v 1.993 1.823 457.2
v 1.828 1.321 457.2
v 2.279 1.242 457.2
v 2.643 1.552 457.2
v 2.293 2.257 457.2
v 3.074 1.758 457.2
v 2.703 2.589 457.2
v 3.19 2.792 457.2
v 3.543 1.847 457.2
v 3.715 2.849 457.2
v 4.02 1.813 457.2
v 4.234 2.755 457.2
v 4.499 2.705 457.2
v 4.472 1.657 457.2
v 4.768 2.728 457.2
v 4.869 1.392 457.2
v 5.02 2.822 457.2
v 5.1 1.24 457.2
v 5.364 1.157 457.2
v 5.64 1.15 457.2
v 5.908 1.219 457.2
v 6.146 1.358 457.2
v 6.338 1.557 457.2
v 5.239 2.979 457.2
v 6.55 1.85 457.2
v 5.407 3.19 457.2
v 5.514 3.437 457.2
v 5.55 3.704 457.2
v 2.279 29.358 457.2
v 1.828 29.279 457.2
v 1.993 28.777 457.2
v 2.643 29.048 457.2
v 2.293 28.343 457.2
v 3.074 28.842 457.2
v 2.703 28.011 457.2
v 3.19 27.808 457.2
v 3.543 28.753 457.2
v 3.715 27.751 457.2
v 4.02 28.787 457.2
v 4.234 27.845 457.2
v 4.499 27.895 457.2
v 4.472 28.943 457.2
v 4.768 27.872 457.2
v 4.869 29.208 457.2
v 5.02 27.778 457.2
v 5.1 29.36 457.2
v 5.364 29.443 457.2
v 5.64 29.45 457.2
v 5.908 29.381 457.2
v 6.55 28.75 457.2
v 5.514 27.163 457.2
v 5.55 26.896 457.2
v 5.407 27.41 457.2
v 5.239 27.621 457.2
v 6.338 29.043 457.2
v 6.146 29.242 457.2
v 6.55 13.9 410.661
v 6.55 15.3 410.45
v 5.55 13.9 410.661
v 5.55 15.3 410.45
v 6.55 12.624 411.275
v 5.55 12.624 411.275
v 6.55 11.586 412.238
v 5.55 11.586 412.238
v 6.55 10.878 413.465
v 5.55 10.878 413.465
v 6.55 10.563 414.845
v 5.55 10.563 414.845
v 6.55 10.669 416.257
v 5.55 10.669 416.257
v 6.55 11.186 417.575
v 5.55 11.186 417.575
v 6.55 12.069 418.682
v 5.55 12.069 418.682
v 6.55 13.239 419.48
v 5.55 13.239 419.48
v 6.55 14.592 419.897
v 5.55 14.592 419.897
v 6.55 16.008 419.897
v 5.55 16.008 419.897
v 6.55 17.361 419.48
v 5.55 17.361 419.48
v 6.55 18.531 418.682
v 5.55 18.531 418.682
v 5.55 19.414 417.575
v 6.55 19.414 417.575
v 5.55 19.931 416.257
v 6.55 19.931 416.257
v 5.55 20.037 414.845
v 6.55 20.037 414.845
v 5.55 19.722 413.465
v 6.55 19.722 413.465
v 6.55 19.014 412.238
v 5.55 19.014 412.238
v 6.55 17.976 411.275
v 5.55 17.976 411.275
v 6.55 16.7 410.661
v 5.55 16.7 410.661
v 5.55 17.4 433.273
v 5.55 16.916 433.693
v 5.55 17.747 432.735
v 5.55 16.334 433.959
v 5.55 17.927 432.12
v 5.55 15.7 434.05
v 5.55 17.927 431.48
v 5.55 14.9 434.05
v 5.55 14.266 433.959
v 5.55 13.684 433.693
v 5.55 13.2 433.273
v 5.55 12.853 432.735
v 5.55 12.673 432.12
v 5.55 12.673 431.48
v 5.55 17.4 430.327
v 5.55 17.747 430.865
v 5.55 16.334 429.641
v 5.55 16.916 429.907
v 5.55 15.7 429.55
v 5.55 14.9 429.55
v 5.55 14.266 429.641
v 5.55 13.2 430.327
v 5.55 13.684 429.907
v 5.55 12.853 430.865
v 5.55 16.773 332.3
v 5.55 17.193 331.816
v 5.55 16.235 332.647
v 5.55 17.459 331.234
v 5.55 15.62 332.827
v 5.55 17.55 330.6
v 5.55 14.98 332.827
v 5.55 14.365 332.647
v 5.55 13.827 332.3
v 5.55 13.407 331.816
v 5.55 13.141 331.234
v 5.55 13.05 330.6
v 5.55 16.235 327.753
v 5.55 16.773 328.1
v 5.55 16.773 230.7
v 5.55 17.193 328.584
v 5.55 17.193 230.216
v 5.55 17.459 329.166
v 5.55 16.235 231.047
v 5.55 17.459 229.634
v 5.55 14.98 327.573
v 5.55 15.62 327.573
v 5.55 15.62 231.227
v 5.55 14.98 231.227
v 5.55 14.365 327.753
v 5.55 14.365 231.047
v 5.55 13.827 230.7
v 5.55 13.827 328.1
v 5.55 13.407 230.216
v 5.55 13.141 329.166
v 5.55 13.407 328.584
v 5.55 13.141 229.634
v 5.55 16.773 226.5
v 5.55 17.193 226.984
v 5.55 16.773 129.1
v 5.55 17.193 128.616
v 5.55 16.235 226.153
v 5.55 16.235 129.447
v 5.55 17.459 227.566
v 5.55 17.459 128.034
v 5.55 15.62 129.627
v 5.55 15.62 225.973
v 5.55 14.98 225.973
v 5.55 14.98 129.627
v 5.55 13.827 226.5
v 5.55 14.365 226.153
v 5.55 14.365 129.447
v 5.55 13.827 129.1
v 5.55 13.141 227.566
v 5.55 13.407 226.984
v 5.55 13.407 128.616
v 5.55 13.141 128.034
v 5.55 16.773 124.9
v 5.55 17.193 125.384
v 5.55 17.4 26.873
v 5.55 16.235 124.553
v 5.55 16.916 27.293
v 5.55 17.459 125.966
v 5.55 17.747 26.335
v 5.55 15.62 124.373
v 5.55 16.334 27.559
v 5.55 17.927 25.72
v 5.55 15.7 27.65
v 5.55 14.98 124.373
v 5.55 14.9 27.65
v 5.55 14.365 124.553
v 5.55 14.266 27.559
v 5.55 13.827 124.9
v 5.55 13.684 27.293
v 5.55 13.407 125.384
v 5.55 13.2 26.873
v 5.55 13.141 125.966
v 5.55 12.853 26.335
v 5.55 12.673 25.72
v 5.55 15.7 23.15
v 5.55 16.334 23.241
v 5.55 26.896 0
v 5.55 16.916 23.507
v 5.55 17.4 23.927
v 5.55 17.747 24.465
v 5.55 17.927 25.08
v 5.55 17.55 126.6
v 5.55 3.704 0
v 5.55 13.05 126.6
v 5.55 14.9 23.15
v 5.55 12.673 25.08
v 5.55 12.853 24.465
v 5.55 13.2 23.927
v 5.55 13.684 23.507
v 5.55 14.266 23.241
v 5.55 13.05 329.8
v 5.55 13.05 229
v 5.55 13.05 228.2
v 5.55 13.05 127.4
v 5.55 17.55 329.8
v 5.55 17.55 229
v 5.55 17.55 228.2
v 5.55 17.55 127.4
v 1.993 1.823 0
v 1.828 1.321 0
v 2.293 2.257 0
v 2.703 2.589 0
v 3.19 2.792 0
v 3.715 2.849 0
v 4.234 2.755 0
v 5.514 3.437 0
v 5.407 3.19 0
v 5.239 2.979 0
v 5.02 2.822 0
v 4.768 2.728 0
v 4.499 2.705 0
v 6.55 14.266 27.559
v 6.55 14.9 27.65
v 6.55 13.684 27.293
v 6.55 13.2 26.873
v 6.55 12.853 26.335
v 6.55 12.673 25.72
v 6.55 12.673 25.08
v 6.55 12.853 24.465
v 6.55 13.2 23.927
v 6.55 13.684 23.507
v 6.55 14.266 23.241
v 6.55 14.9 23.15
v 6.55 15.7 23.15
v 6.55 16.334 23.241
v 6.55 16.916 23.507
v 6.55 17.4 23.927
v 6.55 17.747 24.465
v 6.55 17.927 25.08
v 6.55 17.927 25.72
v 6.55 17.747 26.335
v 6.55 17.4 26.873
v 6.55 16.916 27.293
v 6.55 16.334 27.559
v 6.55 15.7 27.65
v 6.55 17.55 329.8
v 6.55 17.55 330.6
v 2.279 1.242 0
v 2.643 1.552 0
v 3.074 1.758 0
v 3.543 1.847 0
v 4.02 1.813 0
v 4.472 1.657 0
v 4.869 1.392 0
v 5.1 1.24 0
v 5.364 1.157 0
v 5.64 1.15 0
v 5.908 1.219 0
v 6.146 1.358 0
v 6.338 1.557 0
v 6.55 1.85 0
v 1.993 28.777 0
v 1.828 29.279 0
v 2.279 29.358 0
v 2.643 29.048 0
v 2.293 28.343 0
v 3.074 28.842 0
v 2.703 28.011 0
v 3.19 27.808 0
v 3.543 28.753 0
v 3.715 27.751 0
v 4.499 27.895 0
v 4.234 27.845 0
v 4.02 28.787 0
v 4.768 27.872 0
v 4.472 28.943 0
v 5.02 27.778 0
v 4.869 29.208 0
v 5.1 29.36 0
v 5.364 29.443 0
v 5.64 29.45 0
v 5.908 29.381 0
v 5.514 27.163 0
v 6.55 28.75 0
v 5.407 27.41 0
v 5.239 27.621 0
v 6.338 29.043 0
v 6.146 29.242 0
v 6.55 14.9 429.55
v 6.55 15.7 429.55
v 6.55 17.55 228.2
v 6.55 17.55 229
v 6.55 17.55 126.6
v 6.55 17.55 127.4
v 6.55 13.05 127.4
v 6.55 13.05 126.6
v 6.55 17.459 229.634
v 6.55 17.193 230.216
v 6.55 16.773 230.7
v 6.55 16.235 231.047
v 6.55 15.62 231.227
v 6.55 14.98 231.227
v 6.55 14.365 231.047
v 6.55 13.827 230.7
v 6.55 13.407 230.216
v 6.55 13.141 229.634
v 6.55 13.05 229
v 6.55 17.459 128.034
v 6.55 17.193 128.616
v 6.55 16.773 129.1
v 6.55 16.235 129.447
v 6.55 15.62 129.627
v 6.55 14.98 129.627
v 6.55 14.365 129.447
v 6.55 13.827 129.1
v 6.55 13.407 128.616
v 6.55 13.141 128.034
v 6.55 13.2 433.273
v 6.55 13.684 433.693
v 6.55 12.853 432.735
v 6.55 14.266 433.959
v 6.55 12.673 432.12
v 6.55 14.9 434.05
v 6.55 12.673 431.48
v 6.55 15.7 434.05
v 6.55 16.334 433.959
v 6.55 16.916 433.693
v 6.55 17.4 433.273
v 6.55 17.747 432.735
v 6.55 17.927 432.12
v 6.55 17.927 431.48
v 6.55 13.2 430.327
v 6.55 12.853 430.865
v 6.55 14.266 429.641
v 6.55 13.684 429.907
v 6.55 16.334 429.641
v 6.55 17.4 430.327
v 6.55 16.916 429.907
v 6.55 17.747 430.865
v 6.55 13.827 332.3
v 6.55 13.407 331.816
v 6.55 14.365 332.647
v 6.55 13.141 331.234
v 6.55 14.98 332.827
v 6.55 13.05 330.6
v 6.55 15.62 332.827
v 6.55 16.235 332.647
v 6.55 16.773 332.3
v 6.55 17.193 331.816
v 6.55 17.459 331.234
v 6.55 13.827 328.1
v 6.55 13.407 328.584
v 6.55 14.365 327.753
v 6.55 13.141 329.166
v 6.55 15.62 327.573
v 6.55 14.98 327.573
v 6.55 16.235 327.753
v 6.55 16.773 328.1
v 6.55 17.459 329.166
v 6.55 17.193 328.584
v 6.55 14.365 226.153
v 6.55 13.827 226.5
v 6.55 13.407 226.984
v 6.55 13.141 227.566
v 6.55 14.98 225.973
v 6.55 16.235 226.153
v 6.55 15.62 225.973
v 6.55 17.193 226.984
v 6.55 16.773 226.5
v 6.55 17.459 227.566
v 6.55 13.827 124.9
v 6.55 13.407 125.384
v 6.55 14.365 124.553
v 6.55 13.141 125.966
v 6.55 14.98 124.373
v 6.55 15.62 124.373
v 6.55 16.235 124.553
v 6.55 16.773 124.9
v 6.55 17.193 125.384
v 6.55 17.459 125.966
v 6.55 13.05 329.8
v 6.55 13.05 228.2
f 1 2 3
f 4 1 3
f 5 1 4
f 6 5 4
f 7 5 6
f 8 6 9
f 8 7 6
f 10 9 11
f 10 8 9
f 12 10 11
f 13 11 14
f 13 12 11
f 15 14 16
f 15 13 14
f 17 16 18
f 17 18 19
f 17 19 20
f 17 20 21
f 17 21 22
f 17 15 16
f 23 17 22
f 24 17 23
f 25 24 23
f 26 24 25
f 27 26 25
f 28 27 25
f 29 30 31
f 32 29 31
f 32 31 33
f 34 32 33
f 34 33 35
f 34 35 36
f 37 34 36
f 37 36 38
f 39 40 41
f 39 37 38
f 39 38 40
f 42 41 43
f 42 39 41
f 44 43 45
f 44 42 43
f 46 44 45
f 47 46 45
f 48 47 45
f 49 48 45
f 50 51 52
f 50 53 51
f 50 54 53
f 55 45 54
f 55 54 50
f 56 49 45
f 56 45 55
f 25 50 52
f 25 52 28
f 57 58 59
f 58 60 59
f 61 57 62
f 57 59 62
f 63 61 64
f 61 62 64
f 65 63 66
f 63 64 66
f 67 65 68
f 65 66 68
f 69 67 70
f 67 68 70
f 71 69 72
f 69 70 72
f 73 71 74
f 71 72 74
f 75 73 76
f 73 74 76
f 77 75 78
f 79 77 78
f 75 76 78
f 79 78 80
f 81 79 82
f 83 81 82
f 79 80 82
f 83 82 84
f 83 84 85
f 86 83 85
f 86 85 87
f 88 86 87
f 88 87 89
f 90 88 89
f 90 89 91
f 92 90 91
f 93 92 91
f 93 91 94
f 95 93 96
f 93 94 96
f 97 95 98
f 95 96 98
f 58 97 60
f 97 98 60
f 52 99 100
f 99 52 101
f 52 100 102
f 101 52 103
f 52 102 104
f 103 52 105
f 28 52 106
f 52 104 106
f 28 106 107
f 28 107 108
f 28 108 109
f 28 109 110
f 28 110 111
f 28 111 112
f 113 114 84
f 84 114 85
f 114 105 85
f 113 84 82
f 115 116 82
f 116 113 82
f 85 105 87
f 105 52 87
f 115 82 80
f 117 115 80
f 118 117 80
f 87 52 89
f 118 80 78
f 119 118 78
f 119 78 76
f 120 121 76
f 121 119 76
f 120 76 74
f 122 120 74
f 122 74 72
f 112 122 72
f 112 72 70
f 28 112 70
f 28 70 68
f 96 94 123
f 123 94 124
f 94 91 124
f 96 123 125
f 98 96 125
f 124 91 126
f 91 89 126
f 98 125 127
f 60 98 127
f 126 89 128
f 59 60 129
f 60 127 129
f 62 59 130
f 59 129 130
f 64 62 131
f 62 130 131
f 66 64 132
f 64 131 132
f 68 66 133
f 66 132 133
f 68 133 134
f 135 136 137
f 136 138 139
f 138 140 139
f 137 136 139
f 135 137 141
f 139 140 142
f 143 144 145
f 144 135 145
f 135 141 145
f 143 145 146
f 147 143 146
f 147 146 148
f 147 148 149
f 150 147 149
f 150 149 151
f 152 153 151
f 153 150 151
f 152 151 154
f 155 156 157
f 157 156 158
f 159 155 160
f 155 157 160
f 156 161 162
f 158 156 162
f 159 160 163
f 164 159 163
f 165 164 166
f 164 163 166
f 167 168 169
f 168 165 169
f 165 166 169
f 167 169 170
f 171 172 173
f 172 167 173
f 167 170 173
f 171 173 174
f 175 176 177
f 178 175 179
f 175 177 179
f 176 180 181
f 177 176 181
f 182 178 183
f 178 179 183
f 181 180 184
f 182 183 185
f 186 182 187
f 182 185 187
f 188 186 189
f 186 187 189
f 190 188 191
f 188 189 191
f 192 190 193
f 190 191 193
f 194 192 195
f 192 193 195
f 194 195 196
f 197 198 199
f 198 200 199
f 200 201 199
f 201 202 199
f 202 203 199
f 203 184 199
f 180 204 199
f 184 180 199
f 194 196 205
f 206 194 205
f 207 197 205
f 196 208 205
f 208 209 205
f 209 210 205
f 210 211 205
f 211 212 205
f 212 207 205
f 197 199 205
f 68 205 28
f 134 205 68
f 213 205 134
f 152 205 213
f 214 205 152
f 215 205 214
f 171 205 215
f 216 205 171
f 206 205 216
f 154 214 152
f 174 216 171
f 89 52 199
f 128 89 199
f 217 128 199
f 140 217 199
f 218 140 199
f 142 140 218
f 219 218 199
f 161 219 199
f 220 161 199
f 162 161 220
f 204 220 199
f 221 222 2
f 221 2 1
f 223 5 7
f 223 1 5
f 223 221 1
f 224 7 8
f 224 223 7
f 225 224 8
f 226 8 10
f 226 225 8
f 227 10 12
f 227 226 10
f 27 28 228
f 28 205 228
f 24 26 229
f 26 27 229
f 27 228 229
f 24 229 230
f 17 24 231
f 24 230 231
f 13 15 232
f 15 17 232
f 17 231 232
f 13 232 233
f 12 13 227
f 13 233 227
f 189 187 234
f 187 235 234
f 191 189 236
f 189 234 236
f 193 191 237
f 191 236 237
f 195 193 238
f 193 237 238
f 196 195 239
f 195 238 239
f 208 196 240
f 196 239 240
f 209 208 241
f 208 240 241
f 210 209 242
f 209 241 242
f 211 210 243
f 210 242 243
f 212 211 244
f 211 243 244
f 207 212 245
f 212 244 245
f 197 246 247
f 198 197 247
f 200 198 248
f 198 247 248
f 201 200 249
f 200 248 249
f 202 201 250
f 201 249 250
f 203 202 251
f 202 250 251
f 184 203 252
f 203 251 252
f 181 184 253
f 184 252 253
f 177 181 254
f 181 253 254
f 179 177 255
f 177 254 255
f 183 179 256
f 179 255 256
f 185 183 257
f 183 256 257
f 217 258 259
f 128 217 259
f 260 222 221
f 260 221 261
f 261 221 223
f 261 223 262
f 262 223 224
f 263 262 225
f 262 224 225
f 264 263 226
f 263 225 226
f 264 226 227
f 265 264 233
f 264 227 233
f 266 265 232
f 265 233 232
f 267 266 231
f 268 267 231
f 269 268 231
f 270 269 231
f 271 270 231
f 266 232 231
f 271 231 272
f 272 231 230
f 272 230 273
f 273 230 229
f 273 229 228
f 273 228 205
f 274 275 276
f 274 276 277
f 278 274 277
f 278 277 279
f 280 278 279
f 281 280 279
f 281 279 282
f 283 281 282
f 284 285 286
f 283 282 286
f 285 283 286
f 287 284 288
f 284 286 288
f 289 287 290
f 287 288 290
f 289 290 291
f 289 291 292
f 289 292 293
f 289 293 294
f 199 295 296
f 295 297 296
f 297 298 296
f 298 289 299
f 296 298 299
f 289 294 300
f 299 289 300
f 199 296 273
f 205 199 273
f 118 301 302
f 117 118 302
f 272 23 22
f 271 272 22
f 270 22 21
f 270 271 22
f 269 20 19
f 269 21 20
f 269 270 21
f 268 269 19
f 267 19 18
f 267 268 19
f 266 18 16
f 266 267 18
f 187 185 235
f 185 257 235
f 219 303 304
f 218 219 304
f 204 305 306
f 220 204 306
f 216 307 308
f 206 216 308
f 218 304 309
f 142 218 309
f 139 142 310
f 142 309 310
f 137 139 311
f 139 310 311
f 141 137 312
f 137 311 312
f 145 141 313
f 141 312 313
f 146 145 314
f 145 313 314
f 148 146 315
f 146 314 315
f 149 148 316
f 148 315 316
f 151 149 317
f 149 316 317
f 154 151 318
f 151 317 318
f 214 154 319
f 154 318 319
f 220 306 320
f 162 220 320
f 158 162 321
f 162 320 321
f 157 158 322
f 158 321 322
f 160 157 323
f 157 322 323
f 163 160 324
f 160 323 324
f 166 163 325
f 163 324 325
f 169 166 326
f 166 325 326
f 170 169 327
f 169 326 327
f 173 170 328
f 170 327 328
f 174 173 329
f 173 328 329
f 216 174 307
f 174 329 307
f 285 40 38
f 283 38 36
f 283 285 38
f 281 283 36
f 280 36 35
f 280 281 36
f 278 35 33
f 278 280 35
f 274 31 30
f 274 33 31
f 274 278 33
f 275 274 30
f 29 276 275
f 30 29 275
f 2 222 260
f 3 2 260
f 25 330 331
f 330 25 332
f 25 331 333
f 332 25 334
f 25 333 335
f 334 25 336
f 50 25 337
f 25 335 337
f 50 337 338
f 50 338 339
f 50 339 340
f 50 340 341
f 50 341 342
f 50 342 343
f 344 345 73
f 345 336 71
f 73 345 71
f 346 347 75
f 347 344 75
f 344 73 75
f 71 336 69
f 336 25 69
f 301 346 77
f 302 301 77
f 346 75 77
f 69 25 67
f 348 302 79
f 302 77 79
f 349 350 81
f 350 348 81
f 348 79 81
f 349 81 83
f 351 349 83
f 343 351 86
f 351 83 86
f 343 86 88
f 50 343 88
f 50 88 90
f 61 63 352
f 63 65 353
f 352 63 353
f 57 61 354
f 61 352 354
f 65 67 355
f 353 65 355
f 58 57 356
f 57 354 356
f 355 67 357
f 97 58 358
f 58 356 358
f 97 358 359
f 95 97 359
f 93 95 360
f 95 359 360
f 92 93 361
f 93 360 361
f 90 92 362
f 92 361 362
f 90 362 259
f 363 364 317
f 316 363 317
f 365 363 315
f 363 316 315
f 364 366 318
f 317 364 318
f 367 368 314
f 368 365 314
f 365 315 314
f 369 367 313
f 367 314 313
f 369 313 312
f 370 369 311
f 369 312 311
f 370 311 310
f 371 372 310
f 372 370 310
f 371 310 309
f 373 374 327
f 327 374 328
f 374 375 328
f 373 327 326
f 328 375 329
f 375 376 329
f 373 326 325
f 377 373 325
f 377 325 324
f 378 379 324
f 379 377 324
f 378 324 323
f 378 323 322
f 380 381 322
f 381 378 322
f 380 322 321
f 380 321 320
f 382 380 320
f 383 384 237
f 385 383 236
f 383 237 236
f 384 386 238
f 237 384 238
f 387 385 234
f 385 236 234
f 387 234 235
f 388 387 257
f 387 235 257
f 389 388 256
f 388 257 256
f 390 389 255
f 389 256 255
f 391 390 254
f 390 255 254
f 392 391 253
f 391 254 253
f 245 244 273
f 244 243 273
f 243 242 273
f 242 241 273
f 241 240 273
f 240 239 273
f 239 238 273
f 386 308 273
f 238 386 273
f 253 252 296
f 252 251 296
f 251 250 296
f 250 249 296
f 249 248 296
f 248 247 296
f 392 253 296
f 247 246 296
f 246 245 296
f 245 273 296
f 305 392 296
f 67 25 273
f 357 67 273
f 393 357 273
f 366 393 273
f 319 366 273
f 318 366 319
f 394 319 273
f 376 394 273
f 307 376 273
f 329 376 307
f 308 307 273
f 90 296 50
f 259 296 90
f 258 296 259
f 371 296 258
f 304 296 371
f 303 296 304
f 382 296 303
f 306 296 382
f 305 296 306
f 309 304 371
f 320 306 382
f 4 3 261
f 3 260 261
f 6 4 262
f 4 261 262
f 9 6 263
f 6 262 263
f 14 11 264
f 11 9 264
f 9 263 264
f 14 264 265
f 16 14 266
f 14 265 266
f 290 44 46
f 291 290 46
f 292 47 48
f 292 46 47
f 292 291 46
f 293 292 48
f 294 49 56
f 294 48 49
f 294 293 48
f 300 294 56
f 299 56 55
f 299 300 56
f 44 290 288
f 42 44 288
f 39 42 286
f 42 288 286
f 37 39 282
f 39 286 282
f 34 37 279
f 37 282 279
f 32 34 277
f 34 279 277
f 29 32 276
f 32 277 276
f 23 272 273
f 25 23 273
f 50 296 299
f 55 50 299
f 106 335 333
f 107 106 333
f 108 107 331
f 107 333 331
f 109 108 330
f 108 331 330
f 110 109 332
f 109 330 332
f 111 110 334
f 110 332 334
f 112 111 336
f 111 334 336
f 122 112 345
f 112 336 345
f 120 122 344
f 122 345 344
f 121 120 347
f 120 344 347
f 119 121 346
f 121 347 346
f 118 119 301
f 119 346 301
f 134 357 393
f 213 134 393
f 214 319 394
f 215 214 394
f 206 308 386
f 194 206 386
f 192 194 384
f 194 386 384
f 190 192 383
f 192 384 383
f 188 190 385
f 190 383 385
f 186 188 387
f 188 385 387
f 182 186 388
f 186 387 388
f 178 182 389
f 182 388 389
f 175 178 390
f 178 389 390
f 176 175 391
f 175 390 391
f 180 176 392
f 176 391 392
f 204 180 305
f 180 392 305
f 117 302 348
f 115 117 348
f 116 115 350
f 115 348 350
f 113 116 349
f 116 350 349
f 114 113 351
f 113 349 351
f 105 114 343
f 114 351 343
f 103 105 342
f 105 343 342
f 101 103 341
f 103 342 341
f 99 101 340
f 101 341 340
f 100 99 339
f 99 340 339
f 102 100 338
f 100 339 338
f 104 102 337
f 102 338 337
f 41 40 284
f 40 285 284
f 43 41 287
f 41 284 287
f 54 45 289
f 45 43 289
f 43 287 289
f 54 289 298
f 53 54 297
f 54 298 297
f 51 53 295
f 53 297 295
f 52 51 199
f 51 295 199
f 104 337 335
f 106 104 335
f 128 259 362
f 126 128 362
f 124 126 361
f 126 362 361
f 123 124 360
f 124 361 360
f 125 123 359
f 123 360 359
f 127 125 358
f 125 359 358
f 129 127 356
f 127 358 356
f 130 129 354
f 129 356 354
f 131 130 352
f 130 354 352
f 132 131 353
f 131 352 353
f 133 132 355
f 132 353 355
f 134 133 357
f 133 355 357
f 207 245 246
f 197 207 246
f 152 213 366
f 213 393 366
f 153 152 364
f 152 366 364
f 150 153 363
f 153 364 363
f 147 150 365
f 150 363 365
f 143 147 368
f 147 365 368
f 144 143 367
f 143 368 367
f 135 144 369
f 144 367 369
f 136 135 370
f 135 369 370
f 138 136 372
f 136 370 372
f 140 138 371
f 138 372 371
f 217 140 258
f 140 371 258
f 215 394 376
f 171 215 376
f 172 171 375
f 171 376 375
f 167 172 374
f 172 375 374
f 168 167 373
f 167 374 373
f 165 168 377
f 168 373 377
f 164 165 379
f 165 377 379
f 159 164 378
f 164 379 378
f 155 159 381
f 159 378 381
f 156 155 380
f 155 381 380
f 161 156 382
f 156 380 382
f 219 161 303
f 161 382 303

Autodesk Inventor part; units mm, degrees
sketch "Sketch_1" plane through (0, 0, 0) normal (0, 0, 1) x (1, 0, 0)
  arc A0 (1.8281, 29.2788) -> (4.2342, 27.8447) centre (3.65, 29.6) ccw
  arc A1 (5.55, 26.8958) -> (4.2342, 27.8447) centre (4.55, 26.8958) ccw
  line L0 (5.55, 26.8958) -> (5.55, 3.7042)
  arc A2 (4.2342, 2.7553) -> (5.55, 3.7042) centre (4.55, 3.7042) ccw
  arc A3 (4.2342, 2.7553) -> (1.8281, 1.3212) centre (3.65, 1) ccw
  line L1 (1.8281, 1.3212) -> (2.2787, 1.2418)
  arc A4 (4.8691, 1.3916) -> (2.2787, 1.2418) centre (3.65, 0) ccw
  arc A5 (4.8691, 1.3916) -> (6.3379, 1.5571) centre (5.528, 2.1437) ccw
  line L2 (6.3379, 1.5571) -> (6.55, 1.85)
  line L3 (6.55, 1.85) -> (6.55, 28.75)
  line L4 (6.55, 28.75) -> (6.3379, 29.0429)
  arc A6 (6.3379, 29.0429) -> (4.8691, 29.2084) centre (5.528, 28.4563) ccw
  arc A7 (2.2787, 29.3582) -> (4.8691, 29.2084) centre (3.65, 30.6) ccw
  line L5 (2.2787, 29.3582) -> (1.8281, 29.2788)
extrude "Extrusion1" add sketch "Sketch_1" along normal blind 457.2
sketch "Sketch2" plane through (6.55, 1.85, 0) normal (1, 0, 0) x (0, 0, -1)
  point P0 (-415.2, 13.45)
hole "Hole1" at (6.55, 15.3, 415.2) direction (-1, 0, 0) diameter 9.5 depth 1
sketch "Sketch_5" plane through (6.55, 0, 0) normal (1, 0, 0) x (0, 0, -1)
  line L0 (-434.05, 15.7) -> (-434.05, 14.9)
  arc A0 (-434.05, 14.9) -> (-431.8, 12.65) centre (-431.8, 14.9) ccw
  arc A1 (-431.8, 12.65) -> (-429.55, 14.9) centre (-431.8, 14.9) ccw
  line L1 (-429.55, 14.9) -> (-429.55, 15.7)
  arc A2 (-429.55, 15.7) -> (-431.8, 17.95) centre (-431.8, 15.7) ccw
  arc A3 (-431.8, 17.95) -> (-434.05, 15.7) centre (-431.8, 15.7) ccw
extrude "Extrusion2" cut sketch "Sketch_5" against normal blind 1
sketch "Sketch_6" plane through (6.55, 0, 0) normal (1, 0, 0) x (0, 0, -1)
  line L0 (-27.65, 15.7) -> (-27.65, 14.9)
  arc A0 (-27.65, 14.9) -> (-25.4, 12.65) centre (-25.4, 14.9) ccw
  arc A1 (-25.4, 12.65) -> (-23.15, 14.9) centre (-25.4, 14.9) ccw
  line L1 (-23.15, 14.9) -> (-23.15, 15.7)
  arc A2 (-23.15, 15.7) -> (-25.4, 17.95) centre (-25.4, 15.7) ccw
  arc A3 (-25.4, 17.95) -> (-27.65, 15.7) centre (-25.4, 15.7) ccw
extrude "Extrusion3" cut sketch "Sketch_6" against normal blind 1
sketch "Sketch_7" plane through (6.55, 0, 0) normal (1, 0, 0) x (0, 0, -1)
  arc A0 (-332.85, 15.3) -> (-330.6, 13.05) centre (-330.6, 15.3) ccw
  line L0 (-330.6, 13.05) -> (-329.8, 13.05)
  arc A1 (-329.8, 13.05) -> (-327.55, 15.3) centre (-329.8, 15.3) ccw
  arc A2 (-327.55, 15.3) -> (-329.8, 17.55) centre (-329.8, 15.3) ccw
  line L1 (-329.8, 17.55) -> (-330.6, 17.55)
  arc A3 (-330.6, 17.55) -> (-332.85, 15.3) centre (-330.6, 15.3) ccw
extrude "Extrusion4" cut sketch "Sketch_7" against normal blind 1
sketch "Sketch_8" plane through (6.55, 0, 0) normal (1, 0, 0) x (0, 0, -1)
  arc A0 (-231.25, 15.3) -> (-229, 13.05) centre (-229, 15.3) ccw
  line L0 (-229, 13.05) -> (-228.2, 13.05)
  arc A1 (-228.2, 13.05) -> (-225.95, 15.3) centre (-228.2, 15.3) ccw
  arc A2 (-225.95, 15.3) -> (-228.2, 17.55) centre (-228.2, 15.3) ccw
  line L1 (-228.2, 17.55) -> (-229, 17.55)
  arc A3 (-229, 17.55) -> (-231.25, 15.3) centre (-229, 15.3) ccw
extrude "Extrusion5" cut sketch "Sketch_8" against normal blind 1
sketch "Sketch_9" plane through (6.55, 0, 0) normal (1, 0, 0) x (0, 0, -1)
  arc A0 (-129.65, 15.3) -> (-127.4, 13.05) centre (-127.4, 15.3) ccw
  line L0 (-127.4, 13.05) -> (-126.6, 13.05)
  arc A1 (-126.6, 13.05) -> (-124.35, 15.3) centre (-126.6, 15.3) ccw
  arc A2 (-124.35, 15.3) -> (-126.6, 17.55) centre (-126.6, 15.3) ccw
  line L1 (-126.6, 17.55) -> (-127.4, 17.55)
  arc A3 (-127.4, 17.55) -> (-129.65, 15.3) centre (-127.4, 15.3) ccw
extrude "Extrusion6" cut sketch "Sketch_9" against normal blind 1
ref_plane "to_body_XY" through (6.5, 15.3, 228.6) normal (0, 0, 1) x (1, 0, 0)
ref_plane "to_body_YZ" through (6.5, 15.3, 228.6) normal (1, 0, 0) x (0, 1, 0)
ref_plane "to_body_ZX" through (6.5, 15.3, 228.6) normal (0, 1, 0) x (0, 0, 1)
ref_plane "to_slider_XY" through (6.5, 15.3, 228.6) normal (0, 0, 1) x (1, 0, 0)
ref_plane "to_slider_YZ" through (6.5, 15.3, 228.6) normal (1, 0, 0) x (0, 1, 0)
ref_plane "to_slider_ZX" through (6.5, 15.3, 228.6) normal (0, 1, 0) x (0, 0, 1)
properties part number "rail_SSRN3618" material "鉄 灰色"
